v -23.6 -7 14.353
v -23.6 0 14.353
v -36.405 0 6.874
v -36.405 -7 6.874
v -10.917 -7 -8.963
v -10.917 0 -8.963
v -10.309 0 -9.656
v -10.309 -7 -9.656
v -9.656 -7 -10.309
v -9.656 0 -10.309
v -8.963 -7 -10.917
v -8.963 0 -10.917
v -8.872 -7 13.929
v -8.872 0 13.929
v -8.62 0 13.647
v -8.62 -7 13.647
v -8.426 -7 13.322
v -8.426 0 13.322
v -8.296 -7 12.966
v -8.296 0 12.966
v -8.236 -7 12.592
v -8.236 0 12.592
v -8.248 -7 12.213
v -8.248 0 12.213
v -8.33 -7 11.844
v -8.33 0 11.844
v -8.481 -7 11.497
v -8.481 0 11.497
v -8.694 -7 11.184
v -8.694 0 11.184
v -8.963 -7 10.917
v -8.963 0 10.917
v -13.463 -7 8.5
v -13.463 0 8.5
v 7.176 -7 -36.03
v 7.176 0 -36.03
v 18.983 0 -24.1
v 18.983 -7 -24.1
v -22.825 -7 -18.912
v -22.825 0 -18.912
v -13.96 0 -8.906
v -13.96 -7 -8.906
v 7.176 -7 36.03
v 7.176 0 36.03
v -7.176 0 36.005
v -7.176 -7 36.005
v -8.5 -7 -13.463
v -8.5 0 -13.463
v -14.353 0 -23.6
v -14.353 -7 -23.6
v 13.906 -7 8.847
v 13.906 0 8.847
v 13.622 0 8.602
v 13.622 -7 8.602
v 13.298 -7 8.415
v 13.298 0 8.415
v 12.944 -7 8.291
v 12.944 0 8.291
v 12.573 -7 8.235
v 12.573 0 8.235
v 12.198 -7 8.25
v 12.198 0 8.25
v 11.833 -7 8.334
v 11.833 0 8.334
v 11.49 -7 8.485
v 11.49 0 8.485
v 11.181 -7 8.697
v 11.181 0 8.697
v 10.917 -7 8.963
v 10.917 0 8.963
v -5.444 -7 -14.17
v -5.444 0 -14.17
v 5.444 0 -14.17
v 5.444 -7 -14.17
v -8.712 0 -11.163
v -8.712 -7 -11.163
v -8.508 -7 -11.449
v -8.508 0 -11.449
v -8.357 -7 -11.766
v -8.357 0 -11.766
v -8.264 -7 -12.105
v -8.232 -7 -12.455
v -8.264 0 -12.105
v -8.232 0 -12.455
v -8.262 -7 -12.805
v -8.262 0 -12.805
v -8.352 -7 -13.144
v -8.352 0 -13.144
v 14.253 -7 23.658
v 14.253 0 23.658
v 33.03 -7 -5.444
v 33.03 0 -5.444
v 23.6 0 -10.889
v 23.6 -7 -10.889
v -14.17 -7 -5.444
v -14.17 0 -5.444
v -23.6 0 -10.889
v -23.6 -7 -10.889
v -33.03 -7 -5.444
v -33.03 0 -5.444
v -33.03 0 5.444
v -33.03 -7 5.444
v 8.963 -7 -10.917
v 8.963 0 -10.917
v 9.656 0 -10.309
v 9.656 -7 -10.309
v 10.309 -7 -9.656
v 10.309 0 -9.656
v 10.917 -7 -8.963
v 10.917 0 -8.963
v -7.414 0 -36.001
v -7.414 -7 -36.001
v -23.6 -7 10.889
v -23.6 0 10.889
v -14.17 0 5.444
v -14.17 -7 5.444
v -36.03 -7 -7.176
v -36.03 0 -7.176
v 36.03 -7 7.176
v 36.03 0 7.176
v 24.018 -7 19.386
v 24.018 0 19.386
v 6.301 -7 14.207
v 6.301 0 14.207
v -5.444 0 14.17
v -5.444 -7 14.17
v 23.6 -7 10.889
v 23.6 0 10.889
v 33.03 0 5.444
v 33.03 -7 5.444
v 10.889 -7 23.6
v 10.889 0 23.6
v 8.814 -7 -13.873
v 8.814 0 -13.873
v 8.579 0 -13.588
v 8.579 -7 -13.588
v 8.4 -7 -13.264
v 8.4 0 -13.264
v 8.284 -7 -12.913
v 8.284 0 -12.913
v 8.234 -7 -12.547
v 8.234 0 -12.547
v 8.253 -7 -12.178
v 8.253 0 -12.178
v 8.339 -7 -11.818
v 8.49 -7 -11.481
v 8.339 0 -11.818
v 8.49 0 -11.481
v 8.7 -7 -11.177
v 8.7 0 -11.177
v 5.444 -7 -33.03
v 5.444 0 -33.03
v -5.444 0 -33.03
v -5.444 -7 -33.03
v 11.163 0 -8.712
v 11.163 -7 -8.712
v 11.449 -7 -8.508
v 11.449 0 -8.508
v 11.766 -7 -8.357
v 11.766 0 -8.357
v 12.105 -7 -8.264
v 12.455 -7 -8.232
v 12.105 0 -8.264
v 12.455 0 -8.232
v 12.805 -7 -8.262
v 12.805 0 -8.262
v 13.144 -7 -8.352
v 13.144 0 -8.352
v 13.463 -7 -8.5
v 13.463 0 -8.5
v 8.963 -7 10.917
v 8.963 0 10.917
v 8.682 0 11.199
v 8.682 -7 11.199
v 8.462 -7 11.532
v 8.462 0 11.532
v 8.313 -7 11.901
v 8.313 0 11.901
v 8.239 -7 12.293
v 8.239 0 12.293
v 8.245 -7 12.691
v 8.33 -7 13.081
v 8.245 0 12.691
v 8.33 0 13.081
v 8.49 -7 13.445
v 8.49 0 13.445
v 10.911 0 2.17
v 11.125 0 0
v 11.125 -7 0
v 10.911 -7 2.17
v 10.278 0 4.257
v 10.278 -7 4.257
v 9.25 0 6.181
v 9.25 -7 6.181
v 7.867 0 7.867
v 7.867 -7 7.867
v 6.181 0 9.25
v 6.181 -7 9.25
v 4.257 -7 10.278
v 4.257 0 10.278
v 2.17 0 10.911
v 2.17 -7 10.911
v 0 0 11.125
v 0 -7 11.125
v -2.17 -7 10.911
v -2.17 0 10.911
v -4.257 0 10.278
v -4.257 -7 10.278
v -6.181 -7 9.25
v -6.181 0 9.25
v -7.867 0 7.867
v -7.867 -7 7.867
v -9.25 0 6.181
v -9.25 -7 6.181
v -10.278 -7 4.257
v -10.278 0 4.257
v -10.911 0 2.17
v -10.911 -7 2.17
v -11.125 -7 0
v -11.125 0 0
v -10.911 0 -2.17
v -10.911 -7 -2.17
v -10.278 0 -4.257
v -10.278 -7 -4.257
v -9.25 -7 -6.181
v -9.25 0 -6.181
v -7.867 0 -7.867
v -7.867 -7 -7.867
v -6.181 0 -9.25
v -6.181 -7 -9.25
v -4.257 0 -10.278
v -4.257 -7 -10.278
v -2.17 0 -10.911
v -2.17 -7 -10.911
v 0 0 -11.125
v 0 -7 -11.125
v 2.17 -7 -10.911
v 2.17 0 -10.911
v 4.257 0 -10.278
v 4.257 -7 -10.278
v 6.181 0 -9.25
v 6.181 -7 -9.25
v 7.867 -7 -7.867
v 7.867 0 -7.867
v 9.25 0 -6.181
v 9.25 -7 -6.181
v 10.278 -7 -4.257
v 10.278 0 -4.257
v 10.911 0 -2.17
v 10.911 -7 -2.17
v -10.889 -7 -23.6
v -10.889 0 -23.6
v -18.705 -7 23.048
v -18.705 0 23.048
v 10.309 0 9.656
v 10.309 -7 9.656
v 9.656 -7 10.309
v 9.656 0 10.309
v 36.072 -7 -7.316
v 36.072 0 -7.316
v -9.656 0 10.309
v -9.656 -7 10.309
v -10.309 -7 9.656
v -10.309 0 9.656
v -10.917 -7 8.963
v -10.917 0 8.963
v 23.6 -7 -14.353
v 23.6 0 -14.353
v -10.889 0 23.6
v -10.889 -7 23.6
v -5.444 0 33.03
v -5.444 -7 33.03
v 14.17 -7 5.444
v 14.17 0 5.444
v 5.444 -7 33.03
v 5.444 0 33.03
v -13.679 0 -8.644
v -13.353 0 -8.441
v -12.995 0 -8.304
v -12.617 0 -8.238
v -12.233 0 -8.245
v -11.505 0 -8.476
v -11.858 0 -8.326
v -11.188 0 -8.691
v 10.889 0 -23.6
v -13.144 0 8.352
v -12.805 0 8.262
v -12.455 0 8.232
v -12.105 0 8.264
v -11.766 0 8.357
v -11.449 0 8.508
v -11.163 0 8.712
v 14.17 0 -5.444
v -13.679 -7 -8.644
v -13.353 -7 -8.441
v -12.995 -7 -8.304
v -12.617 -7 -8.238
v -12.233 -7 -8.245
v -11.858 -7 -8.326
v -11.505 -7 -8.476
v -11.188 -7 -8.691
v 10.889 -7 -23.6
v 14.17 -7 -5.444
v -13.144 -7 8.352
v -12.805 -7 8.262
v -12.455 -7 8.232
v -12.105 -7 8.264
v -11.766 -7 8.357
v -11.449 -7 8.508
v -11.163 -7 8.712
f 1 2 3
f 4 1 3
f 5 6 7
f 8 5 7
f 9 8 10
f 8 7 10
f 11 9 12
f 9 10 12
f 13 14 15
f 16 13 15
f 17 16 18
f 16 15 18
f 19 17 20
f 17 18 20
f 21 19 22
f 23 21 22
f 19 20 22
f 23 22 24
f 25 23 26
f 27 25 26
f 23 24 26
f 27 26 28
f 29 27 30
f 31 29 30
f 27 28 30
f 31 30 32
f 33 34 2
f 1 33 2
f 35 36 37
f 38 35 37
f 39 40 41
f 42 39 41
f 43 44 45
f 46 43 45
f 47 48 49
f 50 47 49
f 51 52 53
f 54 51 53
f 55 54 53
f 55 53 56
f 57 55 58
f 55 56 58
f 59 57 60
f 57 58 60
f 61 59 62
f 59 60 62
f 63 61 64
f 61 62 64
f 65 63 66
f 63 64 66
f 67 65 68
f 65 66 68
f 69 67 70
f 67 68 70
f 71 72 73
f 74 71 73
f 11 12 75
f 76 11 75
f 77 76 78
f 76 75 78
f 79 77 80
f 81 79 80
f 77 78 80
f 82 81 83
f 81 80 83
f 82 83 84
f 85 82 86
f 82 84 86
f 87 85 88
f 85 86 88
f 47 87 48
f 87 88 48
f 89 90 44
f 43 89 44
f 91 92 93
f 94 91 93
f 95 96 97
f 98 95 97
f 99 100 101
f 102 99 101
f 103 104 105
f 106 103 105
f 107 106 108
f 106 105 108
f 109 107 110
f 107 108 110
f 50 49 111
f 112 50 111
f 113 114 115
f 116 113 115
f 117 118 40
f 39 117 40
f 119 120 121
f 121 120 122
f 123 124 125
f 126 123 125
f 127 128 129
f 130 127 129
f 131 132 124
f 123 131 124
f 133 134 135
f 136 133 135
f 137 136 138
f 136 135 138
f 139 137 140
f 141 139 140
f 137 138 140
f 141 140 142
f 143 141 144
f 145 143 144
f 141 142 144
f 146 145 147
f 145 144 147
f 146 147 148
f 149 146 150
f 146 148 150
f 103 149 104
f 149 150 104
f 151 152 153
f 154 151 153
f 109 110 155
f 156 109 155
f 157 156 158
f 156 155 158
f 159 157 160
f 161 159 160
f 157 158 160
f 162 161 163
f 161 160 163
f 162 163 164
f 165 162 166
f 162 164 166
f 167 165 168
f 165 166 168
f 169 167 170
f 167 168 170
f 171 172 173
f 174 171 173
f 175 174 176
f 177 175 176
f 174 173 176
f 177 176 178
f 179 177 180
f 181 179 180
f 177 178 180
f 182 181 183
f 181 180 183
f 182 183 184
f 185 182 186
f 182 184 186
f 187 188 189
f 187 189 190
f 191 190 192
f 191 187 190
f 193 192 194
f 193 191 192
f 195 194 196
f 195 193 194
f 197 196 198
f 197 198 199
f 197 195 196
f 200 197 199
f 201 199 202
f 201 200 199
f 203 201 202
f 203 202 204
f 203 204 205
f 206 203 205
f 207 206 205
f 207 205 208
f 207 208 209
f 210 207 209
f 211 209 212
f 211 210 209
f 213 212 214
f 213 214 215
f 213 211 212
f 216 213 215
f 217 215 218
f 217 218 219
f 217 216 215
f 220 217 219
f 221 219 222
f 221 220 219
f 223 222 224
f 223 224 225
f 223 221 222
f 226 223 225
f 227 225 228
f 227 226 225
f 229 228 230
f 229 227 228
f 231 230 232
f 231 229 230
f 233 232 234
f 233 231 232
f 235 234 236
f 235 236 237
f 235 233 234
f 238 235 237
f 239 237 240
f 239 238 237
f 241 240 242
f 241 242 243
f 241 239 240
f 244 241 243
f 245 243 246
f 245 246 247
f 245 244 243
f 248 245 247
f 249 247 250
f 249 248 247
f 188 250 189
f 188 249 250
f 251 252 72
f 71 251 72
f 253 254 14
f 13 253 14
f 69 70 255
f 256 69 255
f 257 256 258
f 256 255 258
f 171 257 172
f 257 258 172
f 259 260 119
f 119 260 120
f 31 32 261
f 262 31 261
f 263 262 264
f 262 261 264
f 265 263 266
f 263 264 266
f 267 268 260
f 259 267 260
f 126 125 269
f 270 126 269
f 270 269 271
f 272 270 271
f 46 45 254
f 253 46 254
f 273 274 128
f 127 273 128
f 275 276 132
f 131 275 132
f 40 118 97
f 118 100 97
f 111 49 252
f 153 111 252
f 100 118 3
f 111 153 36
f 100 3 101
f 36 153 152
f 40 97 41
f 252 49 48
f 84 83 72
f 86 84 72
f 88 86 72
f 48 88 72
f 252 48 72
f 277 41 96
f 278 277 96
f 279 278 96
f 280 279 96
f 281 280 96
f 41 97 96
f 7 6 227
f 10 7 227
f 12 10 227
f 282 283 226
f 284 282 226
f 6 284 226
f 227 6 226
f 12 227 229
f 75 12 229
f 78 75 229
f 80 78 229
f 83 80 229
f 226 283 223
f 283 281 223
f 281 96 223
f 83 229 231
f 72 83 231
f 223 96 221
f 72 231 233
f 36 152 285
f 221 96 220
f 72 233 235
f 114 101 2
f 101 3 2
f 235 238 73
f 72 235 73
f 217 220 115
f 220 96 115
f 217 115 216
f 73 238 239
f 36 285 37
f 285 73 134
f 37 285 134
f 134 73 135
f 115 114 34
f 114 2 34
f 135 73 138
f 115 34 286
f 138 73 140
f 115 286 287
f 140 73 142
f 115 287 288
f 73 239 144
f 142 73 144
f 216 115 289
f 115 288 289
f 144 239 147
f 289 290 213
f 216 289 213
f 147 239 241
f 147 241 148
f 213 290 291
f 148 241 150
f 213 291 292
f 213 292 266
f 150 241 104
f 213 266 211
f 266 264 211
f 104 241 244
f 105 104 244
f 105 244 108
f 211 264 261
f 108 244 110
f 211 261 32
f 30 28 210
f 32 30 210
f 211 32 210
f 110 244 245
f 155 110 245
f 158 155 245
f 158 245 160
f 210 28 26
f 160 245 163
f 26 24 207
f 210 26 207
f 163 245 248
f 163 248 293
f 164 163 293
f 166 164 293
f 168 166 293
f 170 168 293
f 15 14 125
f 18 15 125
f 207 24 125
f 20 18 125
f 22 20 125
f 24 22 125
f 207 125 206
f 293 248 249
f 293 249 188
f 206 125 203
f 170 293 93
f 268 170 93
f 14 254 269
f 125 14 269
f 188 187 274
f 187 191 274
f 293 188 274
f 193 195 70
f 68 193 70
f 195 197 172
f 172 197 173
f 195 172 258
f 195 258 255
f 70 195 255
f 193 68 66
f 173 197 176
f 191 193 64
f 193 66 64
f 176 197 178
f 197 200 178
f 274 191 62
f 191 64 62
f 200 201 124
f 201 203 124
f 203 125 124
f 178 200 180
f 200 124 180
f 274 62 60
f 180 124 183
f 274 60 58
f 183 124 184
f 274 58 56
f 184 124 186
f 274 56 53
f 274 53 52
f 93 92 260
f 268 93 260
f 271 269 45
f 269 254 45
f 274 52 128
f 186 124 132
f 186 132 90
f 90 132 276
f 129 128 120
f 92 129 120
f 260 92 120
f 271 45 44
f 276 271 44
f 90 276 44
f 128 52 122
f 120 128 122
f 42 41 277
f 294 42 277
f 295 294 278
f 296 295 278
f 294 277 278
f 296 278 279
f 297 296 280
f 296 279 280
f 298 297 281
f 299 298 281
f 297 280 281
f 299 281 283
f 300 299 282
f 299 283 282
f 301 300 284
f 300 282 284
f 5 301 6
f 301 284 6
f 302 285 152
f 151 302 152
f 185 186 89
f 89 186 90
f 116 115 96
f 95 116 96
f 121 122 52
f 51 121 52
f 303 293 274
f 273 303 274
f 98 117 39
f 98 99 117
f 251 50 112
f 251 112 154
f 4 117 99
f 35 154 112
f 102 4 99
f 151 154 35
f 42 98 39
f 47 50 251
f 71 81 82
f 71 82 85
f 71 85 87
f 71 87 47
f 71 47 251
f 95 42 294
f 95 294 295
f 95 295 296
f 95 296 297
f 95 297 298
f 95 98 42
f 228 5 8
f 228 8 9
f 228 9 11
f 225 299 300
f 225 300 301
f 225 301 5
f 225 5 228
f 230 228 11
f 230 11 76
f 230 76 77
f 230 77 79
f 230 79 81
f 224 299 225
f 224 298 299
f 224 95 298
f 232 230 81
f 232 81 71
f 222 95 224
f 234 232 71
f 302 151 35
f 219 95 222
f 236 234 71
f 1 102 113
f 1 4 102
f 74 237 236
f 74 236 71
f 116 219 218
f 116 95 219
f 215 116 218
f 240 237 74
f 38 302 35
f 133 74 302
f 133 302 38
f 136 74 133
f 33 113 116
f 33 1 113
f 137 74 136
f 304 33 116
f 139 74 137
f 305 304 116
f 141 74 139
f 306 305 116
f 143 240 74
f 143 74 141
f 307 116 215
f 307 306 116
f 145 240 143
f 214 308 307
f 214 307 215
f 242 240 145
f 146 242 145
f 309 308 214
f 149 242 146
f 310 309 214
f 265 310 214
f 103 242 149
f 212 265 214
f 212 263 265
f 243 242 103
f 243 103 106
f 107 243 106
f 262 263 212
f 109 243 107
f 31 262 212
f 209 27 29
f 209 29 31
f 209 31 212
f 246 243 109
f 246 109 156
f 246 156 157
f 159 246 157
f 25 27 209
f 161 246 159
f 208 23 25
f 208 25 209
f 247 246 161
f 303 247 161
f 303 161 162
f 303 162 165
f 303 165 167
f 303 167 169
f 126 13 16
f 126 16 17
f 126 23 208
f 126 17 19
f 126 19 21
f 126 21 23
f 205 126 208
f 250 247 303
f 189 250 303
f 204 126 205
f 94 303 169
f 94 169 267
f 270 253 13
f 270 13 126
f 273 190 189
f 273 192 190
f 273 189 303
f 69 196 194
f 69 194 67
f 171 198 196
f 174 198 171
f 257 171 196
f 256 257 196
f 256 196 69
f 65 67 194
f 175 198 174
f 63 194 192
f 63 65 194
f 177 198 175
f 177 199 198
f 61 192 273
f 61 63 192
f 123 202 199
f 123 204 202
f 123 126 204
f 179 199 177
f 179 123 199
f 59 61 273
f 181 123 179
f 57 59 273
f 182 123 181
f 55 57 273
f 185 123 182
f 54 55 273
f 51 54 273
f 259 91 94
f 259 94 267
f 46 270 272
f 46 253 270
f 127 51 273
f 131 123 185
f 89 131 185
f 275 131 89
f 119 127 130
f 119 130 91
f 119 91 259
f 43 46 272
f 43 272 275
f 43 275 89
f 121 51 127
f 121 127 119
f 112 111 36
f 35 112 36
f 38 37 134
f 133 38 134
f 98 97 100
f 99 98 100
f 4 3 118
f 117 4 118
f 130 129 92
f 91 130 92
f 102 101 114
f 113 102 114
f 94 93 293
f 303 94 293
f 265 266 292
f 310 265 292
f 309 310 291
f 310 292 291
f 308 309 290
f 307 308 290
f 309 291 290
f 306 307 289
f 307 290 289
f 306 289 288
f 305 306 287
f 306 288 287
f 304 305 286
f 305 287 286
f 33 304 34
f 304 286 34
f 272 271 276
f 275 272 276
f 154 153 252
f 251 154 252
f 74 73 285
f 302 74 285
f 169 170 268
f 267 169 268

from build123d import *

# Parameters (mm, degrees)
F0_R     = 11.125
F1_DEPTH = 7


with BuildPart() as f1:
    # F0 (on Front) → F1 (new body)
    with BuildSketch(Plane.XZ):
        with BuildLine():
            Line((7.176464, 36.03), (-7.176464, 36.00459))
            Line((-7.176464, 36.00459), (-18.705031, 23.047823))
            Line((-18.705031, 23.047823), (-8.872226, 13.929126))
            ThreePointArc((-8.872226, 13.929126), (-8.233094, 12.40237), (-8.963077, 10.916908))
            ThreePointArc((-8.963077, 10.916908), (-9.987883, 9.987883), (-10.916908, 8.963077))
            ThreePointArc((-10.916908, 8.963077), (-12.104836, 8.264456), (-13.462665, 8.500134))
            Line((-13.462665, 8.500134), (-23.6, 14.352928))
            Line((-23.6, 14.352928), (-36.404543, 6.874131))
            Line((-36.404543, 6.874131), (-36.03, -7.176464))
            Line((-36.03, -7.176464), (-22.824744, -18.912232))
            Line((-22.824744, -18.912232), (-13.959667, -8.905918))
            ThreePointArc((-13.959667, -8.905918), (-12.425101, -8.232538), (-10.916908, -8.963077))
            ThreePointArc((-10.916908, -8.963077), (-9.987883, -9.987883), (-8.963077, -10.916908))
            ThreePointArc((-8.963077, -10.916908), (-8.264456, -12.104836), (-8.500134, -13.462665))
            Line((-8.500134, -13.462665), (-14.352928, -23.6))
            Line((-14.352928, -23.6), (-7.413959, -36.001418))
            Line((-7.413959, -36.001418), (7.176464, -36.03))
            Line((7.176464, -36.03), (18.982723, -24.100019))
            Line((18.982723, -24.100019), (8.813928, -13.872823))
            ThreePointArc((8.813928, -13.872823), (8.234726, -12.361877), (8.963077, -10.916908))
            ThreePointArc((8.963077, -10.916908), (9.987883, -9.987883), (10.916908, -8.963077))
            ThreePointArc((10.916908, -8.963077), (12.104836, -8.264456), (13.462665, -8.500134))
            Line((13.462665, -8.500134), (23.6, -14.352928))
            Line((23.6, -14.352928), (36.071911, -7.315997))
            Line((36.071911, -7.315997), (36.03, 7.176464))
            Line((36.03, 7.176464), (24.017932, 19.385856))
            Line((24.017932, 19.385856), (13.90576, 8.847456))
            ThreePointArc((13.90576, 8.847456), (12.385354, 8.23368), (10.916908, 8.963077))
            ThreePointArc((10.916908, 8.963077), (9.987883, 9.987883), (8.963077, 10.916908))
            ThreePointArc((8.963077, 10.916908), (8.26625, 12.095108), (8.490328, 13.445484))
            Line((8.490328, 13.445484), (14.252684, 23.658151))
            Line((14.252684, 23.658151), (7.176464, 36.03))
        make_face()
        Polygon((5.444413, -33.03), (-5.444413, -33.03), (-10.888826, -23.6), (-5.444413, -14.17), (5.444413, -14.17), (10.888826, -23.6), align=None, mode=Mode.SUBTRACT)
        Polygon((-33.03, -5.444413), (-33.03, 5.444413), (-23.6, 10.888826), (-14.17, 5.444413), (-14.17, -5.444413), (-23.6, -10.888826), align=None, mode=Mode.SUBTRACT)
        Circle(F0_R, mode=Mode.SUBTRACT)
        Polygon((33.03, 5.444413), (33.03, -5.444413), (23.6, -10.888826), (14.17, -5.444413), (14.17, 5.444413), (23.6, 10.888826), align=None, mode=Mode.SUBTRACT)
        Polygon((-10.888826, 23.6), (-5.444413, 33.03), (5.444413, 33.03), (10.888826, 23.6), (6.300824, 14.207265), (-5.444413, 14.17), align=None, mode=Mode.SUBTRACT)
    extrude(amount=F1_DEPTH)


solid = f1.part
